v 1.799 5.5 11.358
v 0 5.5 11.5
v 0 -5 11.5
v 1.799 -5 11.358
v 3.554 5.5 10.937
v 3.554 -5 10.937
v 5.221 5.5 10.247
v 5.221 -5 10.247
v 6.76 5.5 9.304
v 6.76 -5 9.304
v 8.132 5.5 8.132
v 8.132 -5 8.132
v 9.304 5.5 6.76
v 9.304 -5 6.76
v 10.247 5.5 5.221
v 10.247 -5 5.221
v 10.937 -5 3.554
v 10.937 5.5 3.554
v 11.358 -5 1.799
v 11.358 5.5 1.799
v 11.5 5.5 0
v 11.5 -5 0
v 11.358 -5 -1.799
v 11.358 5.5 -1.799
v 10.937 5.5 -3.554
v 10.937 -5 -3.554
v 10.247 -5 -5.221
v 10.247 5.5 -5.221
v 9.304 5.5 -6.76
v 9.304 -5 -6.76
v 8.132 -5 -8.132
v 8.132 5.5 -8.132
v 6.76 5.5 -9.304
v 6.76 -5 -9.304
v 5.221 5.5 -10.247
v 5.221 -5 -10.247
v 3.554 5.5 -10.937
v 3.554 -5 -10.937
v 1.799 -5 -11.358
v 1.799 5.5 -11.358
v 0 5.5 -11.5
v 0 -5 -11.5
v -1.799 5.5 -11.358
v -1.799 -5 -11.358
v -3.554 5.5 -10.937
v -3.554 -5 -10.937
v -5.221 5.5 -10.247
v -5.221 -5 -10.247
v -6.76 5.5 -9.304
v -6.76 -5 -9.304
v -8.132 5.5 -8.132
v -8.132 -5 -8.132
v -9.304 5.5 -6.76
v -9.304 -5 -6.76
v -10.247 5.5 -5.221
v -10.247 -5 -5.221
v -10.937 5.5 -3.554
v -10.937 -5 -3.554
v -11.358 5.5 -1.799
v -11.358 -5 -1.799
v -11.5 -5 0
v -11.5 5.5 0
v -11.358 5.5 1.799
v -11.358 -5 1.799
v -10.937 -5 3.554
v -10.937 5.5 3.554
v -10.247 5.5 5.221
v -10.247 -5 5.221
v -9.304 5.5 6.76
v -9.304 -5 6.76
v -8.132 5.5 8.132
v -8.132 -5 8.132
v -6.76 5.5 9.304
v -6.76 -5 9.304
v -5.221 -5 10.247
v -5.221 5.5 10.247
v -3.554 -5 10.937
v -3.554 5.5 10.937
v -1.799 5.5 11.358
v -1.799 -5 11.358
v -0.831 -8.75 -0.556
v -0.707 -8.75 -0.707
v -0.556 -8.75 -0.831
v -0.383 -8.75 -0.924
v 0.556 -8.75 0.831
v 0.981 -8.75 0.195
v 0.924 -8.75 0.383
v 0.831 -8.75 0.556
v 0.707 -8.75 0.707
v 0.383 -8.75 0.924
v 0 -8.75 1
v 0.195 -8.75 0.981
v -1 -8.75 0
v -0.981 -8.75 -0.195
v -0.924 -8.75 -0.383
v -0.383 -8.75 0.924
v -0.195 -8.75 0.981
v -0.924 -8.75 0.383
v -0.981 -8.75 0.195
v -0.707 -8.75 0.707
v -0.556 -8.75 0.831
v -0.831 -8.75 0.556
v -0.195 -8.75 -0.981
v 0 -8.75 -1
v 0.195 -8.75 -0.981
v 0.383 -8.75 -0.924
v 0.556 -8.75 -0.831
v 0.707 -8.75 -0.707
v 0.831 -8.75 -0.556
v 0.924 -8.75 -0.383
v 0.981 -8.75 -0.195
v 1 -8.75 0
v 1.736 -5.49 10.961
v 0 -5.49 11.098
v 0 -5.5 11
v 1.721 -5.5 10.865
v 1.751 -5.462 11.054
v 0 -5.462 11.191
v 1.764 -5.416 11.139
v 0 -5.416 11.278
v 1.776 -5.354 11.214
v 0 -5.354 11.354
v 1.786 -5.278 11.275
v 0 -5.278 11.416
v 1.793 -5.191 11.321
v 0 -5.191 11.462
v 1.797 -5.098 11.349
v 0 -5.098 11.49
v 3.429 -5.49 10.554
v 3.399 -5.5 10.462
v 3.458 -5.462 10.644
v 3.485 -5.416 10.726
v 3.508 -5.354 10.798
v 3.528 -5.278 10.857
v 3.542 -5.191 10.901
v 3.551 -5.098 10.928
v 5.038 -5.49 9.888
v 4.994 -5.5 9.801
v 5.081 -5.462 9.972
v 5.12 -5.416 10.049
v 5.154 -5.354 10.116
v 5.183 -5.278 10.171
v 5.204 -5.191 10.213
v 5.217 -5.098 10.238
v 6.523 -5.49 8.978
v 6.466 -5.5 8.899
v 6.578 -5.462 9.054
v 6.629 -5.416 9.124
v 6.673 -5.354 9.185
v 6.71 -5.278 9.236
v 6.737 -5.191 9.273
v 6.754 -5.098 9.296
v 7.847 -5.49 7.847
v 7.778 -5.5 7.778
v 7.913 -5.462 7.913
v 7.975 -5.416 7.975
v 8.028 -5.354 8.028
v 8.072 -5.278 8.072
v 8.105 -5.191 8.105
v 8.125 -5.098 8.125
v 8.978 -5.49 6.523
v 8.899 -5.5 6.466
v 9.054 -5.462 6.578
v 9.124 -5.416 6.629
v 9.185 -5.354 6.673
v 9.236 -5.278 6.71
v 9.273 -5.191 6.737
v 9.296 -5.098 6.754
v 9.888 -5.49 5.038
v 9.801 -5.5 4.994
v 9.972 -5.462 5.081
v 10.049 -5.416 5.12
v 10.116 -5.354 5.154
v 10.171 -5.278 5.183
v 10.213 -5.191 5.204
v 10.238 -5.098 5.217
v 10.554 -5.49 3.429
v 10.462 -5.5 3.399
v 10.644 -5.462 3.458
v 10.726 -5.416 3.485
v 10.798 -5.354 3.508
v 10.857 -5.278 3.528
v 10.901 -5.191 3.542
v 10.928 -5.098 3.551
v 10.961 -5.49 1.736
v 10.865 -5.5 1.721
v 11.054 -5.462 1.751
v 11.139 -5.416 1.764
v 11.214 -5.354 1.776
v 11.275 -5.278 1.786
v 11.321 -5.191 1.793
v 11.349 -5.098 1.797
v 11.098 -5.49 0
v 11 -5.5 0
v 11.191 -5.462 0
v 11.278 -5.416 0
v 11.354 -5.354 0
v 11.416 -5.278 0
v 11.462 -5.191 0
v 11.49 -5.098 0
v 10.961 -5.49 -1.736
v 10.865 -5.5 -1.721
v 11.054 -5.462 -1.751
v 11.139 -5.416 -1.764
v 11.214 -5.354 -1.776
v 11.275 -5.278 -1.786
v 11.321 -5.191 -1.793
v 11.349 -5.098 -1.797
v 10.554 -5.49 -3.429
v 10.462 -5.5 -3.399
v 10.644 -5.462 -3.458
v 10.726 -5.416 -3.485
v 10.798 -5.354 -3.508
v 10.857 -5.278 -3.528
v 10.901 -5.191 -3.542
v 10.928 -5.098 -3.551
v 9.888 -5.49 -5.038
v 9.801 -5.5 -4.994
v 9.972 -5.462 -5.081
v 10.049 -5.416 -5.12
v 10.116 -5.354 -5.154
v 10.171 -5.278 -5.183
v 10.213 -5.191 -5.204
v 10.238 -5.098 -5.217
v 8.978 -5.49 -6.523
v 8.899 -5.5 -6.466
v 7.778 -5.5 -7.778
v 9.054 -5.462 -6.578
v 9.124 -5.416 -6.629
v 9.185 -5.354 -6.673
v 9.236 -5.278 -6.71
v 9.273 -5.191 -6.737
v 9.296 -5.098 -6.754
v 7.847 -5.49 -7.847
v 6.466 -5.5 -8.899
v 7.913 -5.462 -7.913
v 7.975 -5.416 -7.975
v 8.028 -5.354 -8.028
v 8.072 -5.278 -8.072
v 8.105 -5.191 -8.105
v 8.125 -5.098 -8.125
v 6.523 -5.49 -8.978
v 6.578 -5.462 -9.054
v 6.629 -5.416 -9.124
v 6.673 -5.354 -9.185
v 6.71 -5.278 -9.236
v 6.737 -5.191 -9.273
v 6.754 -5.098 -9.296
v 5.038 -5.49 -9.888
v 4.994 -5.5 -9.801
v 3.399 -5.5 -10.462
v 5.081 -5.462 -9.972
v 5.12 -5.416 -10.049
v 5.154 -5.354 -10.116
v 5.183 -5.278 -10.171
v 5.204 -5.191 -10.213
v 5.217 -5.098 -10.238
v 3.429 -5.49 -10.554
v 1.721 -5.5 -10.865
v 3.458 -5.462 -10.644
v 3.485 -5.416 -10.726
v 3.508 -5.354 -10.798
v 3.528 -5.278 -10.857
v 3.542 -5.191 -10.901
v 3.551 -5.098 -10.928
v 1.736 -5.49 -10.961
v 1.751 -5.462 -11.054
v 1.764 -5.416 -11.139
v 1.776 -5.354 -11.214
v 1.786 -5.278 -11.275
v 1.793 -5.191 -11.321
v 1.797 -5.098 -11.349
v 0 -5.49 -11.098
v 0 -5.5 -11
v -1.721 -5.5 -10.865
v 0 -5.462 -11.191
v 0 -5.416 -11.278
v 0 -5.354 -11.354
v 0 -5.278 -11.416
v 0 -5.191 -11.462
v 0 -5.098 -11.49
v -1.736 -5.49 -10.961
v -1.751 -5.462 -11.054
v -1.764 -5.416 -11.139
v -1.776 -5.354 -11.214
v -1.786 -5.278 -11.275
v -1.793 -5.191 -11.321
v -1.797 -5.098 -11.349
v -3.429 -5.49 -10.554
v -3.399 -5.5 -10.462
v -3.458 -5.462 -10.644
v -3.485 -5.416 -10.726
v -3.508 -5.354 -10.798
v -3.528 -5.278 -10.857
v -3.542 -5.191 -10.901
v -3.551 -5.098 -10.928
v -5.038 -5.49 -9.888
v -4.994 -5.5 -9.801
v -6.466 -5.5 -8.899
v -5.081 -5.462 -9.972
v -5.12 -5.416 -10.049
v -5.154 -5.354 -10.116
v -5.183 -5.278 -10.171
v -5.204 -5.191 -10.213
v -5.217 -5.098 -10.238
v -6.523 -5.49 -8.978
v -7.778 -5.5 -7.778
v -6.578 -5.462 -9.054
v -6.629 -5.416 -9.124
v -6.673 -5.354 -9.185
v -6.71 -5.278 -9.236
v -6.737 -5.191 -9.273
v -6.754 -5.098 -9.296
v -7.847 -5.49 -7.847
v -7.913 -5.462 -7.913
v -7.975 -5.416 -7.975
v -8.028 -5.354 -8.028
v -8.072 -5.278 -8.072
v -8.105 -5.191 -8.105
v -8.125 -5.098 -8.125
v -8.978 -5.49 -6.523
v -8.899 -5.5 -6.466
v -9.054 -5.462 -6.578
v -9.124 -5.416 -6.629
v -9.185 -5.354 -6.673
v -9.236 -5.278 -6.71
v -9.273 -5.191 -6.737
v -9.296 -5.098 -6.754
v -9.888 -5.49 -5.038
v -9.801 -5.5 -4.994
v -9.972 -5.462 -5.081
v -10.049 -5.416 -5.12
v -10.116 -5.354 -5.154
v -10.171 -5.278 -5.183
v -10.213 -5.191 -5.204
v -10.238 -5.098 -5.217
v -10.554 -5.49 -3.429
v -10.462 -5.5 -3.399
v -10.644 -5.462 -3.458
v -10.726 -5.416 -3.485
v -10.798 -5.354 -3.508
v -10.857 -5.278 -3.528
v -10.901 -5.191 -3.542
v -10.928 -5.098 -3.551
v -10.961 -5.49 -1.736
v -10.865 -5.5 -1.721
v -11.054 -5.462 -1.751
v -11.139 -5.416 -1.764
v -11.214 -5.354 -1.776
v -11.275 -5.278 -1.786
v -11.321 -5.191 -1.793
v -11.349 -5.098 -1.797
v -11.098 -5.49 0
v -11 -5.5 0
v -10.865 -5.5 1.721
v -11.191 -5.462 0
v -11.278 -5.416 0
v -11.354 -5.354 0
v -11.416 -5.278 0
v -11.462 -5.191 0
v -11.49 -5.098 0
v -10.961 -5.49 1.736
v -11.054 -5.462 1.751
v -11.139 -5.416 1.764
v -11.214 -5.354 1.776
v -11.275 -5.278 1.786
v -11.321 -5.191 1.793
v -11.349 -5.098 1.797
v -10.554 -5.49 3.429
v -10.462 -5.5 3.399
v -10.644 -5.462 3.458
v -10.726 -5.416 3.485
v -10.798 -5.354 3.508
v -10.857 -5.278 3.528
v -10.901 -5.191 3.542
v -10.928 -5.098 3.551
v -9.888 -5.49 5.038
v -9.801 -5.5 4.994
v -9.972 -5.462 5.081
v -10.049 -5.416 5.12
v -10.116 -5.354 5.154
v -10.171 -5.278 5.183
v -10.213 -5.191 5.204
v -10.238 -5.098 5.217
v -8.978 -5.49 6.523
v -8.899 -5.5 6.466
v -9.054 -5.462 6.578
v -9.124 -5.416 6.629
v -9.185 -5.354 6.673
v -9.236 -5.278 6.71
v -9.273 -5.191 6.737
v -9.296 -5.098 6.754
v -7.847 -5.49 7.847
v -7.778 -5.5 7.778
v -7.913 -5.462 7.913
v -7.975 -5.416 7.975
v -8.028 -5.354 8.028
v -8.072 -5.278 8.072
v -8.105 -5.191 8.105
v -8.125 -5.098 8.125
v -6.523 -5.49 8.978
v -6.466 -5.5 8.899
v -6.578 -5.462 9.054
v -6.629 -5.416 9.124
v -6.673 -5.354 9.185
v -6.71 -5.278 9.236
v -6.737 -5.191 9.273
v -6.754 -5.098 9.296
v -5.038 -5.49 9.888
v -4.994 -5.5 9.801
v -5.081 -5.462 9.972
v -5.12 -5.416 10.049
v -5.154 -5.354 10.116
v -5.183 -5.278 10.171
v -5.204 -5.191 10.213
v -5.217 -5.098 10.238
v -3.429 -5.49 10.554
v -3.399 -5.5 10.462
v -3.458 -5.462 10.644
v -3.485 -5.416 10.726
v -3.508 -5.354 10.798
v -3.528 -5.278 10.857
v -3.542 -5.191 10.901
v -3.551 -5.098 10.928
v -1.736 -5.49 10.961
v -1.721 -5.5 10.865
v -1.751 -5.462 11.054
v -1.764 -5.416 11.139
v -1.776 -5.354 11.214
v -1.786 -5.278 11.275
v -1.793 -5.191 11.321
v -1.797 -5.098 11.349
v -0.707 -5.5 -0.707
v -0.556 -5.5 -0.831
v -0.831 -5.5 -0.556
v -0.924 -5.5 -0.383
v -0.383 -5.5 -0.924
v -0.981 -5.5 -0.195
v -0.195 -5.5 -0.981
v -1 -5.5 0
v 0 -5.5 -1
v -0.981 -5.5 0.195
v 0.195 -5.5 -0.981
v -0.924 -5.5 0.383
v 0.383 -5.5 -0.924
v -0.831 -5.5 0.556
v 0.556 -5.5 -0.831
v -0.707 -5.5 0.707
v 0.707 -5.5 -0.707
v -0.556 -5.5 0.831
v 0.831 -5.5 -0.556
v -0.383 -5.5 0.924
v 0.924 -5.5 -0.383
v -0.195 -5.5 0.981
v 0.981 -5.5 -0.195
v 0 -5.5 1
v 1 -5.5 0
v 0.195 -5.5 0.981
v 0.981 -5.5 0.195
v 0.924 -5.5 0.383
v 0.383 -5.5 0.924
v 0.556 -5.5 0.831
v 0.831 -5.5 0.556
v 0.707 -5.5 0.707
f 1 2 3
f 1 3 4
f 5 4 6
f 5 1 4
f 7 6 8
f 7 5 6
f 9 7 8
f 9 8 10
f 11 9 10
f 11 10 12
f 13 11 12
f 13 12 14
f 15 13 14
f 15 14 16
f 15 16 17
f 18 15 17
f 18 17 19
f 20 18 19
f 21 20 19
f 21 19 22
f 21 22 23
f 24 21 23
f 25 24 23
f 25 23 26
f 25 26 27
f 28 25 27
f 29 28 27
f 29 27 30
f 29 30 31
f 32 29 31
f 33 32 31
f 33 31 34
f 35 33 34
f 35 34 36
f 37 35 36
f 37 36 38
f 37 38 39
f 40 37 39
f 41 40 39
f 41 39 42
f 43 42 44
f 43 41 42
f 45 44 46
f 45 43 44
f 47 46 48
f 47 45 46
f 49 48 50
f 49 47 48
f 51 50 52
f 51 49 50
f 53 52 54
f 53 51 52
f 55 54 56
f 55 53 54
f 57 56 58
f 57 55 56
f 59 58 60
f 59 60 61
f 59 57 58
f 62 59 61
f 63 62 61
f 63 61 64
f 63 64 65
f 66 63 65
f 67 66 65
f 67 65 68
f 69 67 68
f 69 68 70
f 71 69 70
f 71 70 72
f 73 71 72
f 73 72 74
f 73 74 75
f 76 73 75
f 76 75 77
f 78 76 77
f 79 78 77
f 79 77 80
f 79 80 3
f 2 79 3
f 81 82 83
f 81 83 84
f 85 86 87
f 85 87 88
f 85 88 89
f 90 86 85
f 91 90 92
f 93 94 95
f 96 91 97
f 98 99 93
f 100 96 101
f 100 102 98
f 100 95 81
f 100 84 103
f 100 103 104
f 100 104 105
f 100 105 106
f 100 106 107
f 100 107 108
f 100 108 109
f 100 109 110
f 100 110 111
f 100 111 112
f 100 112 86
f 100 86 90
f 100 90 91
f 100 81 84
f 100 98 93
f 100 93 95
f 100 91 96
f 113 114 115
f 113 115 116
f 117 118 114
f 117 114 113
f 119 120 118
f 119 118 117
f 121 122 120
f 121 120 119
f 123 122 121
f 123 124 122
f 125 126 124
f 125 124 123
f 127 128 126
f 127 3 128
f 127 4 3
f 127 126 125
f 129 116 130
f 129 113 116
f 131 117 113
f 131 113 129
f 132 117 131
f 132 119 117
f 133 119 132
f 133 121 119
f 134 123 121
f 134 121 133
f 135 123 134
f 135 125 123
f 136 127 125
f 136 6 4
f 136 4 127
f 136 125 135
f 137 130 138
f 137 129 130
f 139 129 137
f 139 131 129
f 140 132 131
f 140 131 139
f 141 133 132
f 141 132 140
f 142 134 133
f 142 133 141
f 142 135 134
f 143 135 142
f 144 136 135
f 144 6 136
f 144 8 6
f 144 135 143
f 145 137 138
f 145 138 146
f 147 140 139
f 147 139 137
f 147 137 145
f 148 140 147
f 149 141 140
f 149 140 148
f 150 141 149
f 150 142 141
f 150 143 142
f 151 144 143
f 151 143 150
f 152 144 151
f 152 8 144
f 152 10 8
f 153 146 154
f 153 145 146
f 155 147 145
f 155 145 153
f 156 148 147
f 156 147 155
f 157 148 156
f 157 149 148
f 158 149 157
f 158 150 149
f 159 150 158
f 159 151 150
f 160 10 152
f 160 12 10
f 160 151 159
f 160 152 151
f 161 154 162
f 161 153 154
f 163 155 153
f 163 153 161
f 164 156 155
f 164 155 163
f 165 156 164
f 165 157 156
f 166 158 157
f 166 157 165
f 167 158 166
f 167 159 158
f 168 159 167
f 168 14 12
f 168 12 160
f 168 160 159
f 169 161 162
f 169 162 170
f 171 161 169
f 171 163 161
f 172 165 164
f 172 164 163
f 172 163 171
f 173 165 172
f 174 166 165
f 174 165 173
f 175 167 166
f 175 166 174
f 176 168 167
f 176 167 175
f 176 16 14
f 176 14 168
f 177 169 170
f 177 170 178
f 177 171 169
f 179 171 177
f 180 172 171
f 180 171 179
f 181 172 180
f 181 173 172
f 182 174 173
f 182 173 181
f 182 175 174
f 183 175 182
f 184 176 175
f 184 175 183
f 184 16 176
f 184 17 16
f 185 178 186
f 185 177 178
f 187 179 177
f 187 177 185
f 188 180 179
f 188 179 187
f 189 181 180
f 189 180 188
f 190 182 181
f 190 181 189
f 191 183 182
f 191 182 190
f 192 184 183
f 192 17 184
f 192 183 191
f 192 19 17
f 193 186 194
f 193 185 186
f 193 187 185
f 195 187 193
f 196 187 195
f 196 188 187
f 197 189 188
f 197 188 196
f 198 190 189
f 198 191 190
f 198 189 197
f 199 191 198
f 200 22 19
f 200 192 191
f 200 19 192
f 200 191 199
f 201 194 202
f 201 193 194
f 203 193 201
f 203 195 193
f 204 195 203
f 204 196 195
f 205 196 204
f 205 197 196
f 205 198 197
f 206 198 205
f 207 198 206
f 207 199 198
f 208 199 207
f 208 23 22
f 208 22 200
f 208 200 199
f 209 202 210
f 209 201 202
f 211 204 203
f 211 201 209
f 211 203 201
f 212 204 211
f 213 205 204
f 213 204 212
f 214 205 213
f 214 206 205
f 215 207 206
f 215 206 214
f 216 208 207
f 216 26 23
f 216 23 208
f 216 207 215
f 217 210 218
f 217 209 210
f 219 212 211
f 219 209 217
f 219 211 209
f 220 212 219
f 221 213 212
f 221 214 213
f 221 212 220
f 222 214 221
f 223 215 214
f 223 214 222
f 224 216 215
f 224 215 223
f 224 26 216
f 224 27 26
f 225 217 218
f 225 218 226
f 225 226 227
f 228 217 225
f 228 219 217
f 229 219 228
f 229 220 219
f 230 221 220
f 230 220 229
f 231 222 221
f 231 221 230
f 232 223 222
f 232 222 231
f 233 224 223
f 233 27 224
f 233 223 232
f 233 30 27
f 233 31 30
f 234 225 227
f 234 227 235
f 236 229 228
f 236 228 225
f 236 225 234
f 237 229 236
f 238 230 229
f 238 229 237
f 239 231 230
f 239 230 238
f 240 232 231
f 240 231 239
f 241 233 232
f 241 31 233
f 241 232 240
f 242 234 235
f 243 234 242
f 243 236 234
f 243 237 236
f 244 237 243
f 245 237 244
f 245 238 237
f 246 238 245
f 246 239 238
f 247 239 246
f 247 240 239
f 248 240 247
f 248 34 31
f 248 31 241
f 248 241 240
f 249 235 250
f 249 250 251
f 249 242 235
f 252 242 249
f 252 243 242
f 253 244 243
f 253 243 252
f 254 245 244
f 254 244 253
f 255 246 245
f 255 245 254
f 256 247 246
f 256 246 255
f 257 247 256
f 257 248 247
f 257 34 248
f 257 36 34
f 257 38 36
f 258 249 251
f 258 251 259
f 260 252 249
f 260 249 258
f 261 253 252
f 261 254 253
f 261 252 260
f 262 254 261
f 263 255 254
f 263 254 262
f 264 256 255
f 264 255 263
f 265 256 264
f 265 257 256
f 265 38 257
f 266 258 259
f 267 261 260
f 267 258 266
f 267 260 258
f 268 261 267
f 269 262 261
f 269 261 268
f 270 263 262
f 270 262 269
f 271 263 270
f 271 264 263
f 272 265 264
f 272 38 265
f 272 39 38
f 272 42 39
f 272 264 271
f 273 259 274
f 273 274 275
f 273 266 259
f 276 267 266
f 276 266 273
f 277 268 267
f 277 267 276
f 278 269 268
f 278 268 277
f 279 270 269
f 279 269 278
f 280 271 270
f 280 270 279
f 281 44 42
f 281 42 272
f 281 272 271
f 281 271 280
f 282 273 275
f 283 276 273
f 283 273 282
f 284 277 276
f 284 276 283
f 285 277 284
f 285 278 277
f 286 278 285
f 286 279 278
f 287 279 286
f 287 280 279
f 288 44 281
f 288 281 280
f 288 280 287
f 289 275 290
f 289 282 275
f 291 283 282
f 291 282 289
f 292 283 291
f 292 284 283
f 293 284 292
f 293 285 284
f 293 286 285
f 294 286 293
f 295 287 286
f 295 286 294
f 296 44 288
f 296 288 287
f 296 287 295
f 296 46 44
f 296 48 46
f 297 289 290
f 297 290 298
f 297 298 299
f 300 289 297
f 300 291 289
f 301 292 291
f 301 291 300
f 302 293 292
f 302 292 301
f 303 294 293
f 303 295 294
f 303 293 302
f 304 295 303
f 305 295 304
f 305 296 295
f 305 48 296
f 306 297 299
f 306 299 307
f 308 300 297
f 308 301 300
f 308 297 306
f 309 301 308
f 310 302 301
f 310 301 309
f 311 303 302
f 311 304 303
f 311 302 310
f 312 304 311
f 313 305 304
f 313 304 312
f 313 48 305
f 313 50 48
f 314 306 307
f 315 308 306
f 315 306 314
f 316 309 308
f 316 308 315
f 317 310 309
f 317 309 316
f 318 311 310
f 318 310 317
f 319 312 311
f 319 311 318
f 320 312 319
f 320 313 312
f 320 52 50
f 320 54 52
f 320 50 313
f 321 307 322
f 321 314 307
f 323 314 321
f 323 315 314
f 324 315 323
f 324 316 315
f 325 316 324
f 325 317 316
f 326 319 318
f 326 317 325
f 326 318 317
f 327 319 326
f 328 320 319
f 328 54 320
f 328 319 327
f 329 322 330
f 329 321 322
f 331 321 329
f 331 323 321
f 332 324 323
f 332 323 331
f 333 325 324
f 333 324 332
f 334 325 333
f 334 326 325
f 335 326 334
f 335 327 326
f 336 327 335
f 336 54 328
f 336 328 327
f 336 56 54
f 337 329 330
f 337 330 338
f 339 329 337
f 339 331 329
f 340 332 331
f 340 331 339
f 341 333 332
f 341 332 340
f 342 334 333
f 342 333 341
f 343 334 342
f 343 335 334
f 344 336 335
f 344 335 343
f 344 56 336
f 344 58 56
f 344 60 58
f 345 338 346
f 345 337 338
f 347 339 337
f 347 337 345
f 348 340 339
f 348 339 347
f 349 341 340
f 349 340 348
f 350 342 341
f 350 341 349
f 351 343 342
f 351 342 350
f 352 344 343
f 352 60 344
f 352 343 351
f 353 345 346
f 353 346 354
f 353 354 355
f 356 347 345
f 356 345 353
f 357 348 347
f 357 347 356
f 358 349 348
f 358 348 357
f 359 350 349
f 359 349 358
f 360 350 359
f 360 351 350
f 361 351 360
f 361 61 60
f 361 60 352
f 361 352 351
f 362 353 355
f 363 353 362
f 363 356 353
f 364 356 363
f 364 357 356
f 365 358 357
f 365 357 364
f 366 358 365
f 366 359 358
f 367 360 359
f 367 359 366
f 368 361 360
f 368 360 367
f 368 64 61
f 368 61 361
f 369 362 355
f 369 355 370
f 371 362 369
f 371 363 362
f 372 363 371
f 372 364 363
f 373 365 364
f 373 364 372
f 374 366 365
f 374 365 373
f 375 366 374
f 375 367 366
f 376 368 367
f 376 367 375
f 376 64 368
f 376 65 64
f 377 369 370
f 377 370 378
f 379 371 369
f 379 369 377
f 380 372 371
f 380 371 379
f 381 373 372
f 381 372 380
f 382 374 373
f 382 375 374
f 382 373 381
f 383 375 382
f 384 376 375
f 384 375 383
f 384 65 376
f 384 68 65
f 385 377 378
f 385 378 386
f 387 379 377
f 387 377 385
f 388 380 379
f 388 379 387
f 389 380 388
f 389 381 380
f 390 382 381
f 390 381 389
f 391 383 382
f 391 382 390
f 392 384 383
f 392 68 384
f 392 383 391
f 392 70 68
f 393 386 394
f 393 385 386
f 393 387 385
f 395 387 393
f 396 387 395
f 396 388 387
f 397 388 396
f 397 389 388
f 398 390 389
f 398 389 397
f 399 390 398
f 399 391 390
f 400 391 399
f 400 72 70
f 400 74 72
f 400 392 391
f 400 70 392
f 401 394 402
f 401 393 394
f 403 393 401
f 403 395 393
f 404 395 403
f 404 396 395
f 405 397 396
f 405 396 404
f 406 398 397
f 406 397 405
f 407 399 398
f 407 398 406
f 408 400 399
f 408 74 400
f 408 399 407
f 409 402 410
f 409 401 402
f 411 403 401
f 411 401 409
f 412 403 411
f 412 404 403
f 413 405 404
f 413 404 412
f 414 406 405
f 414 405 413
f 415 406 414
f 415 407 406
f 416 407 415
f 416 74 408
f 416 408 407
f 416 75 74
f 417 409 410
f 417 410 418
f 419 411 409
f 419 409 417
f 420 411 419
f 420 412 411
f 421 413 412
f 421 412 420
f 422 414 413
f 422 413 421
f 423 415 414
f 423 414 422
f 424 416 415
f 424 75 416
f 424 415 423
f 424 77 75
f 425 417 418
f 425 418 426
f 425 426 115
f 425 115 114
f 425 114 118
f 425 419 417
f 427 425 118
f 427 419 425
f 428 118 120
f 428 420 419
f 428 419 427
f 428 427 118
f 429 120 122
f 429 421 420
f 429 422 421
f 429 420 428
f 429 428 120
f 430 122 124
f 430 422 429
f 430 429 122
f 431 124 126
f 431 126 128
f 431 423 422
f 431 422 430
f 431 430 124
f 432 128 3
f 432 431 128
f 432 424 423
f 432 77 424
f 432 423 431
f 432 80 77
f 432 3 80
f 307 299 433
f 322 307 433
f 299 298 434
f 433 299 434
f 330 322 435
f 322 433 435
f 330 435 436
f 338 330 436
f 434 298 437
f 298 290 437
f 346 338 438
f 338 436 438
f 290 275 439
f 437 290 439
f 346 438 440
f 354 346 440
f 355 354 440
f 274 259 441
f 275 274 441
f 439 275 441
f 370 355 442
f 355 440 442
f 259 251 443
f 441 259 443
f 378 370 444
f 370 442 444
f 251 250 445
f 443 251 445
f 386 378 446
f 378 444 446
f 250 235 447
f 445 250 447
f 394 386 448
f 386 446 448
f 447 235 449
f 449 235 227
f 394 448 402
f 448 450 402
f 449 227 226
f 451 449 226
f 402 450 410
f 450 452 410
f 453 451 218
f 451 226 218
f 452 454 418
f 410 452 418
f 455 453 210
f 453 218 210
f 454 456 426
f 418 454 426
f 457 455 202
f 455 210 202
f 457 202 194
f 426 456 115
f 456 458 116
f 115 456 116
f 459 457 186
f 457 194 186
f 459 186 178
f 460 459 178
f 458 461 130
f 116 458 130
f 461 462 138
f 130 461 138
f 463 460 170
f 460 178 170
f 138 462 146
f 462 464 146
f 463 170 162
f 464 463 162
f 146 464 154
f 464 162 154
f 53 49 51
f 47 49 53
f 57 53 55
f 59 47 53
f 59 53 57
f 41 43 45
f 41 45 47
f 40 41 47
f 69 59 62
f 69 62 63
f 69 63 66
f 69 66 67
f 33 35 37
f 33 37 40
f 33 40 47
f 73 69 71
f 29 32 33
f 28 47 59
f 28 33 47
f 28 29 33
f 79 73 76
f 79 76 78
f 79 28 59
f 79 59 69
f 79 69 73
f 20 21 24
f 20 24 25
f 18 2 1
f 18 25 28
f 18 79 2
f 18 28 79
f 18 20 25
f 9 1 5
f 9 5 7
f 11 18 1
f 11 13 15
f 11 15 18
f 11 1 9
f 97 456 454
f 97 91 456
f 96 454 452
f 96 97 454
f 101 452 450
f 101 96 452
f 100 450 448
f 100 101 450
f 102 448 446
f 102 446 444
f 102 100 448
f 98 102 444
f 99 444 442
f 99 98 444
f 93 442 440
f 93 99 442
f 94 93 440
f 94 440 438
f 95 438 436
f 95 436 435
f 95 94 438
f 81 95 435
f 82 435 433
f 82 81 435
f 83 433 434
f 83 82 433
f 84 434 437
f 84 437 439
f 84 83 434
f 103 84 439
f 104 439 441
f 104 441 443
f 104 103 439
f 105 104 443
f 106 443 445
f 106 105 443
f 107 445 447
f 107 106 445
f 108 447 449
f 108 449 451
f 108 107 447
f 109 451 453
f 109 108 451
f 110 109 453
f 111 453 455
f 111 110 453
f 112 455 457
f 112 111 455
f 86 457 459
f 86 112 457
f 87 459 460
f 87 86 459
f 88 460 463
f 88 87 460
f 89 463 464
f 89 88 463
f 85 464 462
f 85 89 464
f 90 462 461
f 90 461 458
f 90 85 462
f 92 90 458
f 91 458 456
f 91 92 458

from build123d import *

# Parameters (mm, degrees)
SKETCH1_R           = 11.5
BOSS_EXTRUDE1_DEPTH = 5.5
SKETCH2_R           = 1
BOSS_EXTRUDE2_DEPTH = 3.25
FILLET1_R           = 0.5


with BuildPart() as part:
    # Sketch1 → Boss-Extrude1 (new, symmetric)
    with BuildSketch(Plane(origin=(0, 0, 0), x_dir=(1, 0, 0), z_dir=(0, 1, 0))):
        with Locations(Location((0, 0, 0), (0, 0, 270))):
            Circle(SKETCH1_R)
    extrude(amount=BOSS_EXTRUDE1_DEPTH, both=True)

    # Sketch2 → Boss-Extrude2 (add, symmetric)
    with BuildSketch(Plane.XZ.offset(5.5)):
        with Locations(Location((0, 0, 0), (0, 0, 90))):
            Circle(SKETCH2_R)
    extrude(amount=BOSS_EXTRUDE2_DEPTH, both=True)

    # Fillet1
    fillet1_edges = [part.edges().sort_by_distance(p)[0] for p in [
        (0, -5.5, -11.5),
    ]]
    fillet(fillet1_edges, radius=FILLET1_R)


solid = part.part
